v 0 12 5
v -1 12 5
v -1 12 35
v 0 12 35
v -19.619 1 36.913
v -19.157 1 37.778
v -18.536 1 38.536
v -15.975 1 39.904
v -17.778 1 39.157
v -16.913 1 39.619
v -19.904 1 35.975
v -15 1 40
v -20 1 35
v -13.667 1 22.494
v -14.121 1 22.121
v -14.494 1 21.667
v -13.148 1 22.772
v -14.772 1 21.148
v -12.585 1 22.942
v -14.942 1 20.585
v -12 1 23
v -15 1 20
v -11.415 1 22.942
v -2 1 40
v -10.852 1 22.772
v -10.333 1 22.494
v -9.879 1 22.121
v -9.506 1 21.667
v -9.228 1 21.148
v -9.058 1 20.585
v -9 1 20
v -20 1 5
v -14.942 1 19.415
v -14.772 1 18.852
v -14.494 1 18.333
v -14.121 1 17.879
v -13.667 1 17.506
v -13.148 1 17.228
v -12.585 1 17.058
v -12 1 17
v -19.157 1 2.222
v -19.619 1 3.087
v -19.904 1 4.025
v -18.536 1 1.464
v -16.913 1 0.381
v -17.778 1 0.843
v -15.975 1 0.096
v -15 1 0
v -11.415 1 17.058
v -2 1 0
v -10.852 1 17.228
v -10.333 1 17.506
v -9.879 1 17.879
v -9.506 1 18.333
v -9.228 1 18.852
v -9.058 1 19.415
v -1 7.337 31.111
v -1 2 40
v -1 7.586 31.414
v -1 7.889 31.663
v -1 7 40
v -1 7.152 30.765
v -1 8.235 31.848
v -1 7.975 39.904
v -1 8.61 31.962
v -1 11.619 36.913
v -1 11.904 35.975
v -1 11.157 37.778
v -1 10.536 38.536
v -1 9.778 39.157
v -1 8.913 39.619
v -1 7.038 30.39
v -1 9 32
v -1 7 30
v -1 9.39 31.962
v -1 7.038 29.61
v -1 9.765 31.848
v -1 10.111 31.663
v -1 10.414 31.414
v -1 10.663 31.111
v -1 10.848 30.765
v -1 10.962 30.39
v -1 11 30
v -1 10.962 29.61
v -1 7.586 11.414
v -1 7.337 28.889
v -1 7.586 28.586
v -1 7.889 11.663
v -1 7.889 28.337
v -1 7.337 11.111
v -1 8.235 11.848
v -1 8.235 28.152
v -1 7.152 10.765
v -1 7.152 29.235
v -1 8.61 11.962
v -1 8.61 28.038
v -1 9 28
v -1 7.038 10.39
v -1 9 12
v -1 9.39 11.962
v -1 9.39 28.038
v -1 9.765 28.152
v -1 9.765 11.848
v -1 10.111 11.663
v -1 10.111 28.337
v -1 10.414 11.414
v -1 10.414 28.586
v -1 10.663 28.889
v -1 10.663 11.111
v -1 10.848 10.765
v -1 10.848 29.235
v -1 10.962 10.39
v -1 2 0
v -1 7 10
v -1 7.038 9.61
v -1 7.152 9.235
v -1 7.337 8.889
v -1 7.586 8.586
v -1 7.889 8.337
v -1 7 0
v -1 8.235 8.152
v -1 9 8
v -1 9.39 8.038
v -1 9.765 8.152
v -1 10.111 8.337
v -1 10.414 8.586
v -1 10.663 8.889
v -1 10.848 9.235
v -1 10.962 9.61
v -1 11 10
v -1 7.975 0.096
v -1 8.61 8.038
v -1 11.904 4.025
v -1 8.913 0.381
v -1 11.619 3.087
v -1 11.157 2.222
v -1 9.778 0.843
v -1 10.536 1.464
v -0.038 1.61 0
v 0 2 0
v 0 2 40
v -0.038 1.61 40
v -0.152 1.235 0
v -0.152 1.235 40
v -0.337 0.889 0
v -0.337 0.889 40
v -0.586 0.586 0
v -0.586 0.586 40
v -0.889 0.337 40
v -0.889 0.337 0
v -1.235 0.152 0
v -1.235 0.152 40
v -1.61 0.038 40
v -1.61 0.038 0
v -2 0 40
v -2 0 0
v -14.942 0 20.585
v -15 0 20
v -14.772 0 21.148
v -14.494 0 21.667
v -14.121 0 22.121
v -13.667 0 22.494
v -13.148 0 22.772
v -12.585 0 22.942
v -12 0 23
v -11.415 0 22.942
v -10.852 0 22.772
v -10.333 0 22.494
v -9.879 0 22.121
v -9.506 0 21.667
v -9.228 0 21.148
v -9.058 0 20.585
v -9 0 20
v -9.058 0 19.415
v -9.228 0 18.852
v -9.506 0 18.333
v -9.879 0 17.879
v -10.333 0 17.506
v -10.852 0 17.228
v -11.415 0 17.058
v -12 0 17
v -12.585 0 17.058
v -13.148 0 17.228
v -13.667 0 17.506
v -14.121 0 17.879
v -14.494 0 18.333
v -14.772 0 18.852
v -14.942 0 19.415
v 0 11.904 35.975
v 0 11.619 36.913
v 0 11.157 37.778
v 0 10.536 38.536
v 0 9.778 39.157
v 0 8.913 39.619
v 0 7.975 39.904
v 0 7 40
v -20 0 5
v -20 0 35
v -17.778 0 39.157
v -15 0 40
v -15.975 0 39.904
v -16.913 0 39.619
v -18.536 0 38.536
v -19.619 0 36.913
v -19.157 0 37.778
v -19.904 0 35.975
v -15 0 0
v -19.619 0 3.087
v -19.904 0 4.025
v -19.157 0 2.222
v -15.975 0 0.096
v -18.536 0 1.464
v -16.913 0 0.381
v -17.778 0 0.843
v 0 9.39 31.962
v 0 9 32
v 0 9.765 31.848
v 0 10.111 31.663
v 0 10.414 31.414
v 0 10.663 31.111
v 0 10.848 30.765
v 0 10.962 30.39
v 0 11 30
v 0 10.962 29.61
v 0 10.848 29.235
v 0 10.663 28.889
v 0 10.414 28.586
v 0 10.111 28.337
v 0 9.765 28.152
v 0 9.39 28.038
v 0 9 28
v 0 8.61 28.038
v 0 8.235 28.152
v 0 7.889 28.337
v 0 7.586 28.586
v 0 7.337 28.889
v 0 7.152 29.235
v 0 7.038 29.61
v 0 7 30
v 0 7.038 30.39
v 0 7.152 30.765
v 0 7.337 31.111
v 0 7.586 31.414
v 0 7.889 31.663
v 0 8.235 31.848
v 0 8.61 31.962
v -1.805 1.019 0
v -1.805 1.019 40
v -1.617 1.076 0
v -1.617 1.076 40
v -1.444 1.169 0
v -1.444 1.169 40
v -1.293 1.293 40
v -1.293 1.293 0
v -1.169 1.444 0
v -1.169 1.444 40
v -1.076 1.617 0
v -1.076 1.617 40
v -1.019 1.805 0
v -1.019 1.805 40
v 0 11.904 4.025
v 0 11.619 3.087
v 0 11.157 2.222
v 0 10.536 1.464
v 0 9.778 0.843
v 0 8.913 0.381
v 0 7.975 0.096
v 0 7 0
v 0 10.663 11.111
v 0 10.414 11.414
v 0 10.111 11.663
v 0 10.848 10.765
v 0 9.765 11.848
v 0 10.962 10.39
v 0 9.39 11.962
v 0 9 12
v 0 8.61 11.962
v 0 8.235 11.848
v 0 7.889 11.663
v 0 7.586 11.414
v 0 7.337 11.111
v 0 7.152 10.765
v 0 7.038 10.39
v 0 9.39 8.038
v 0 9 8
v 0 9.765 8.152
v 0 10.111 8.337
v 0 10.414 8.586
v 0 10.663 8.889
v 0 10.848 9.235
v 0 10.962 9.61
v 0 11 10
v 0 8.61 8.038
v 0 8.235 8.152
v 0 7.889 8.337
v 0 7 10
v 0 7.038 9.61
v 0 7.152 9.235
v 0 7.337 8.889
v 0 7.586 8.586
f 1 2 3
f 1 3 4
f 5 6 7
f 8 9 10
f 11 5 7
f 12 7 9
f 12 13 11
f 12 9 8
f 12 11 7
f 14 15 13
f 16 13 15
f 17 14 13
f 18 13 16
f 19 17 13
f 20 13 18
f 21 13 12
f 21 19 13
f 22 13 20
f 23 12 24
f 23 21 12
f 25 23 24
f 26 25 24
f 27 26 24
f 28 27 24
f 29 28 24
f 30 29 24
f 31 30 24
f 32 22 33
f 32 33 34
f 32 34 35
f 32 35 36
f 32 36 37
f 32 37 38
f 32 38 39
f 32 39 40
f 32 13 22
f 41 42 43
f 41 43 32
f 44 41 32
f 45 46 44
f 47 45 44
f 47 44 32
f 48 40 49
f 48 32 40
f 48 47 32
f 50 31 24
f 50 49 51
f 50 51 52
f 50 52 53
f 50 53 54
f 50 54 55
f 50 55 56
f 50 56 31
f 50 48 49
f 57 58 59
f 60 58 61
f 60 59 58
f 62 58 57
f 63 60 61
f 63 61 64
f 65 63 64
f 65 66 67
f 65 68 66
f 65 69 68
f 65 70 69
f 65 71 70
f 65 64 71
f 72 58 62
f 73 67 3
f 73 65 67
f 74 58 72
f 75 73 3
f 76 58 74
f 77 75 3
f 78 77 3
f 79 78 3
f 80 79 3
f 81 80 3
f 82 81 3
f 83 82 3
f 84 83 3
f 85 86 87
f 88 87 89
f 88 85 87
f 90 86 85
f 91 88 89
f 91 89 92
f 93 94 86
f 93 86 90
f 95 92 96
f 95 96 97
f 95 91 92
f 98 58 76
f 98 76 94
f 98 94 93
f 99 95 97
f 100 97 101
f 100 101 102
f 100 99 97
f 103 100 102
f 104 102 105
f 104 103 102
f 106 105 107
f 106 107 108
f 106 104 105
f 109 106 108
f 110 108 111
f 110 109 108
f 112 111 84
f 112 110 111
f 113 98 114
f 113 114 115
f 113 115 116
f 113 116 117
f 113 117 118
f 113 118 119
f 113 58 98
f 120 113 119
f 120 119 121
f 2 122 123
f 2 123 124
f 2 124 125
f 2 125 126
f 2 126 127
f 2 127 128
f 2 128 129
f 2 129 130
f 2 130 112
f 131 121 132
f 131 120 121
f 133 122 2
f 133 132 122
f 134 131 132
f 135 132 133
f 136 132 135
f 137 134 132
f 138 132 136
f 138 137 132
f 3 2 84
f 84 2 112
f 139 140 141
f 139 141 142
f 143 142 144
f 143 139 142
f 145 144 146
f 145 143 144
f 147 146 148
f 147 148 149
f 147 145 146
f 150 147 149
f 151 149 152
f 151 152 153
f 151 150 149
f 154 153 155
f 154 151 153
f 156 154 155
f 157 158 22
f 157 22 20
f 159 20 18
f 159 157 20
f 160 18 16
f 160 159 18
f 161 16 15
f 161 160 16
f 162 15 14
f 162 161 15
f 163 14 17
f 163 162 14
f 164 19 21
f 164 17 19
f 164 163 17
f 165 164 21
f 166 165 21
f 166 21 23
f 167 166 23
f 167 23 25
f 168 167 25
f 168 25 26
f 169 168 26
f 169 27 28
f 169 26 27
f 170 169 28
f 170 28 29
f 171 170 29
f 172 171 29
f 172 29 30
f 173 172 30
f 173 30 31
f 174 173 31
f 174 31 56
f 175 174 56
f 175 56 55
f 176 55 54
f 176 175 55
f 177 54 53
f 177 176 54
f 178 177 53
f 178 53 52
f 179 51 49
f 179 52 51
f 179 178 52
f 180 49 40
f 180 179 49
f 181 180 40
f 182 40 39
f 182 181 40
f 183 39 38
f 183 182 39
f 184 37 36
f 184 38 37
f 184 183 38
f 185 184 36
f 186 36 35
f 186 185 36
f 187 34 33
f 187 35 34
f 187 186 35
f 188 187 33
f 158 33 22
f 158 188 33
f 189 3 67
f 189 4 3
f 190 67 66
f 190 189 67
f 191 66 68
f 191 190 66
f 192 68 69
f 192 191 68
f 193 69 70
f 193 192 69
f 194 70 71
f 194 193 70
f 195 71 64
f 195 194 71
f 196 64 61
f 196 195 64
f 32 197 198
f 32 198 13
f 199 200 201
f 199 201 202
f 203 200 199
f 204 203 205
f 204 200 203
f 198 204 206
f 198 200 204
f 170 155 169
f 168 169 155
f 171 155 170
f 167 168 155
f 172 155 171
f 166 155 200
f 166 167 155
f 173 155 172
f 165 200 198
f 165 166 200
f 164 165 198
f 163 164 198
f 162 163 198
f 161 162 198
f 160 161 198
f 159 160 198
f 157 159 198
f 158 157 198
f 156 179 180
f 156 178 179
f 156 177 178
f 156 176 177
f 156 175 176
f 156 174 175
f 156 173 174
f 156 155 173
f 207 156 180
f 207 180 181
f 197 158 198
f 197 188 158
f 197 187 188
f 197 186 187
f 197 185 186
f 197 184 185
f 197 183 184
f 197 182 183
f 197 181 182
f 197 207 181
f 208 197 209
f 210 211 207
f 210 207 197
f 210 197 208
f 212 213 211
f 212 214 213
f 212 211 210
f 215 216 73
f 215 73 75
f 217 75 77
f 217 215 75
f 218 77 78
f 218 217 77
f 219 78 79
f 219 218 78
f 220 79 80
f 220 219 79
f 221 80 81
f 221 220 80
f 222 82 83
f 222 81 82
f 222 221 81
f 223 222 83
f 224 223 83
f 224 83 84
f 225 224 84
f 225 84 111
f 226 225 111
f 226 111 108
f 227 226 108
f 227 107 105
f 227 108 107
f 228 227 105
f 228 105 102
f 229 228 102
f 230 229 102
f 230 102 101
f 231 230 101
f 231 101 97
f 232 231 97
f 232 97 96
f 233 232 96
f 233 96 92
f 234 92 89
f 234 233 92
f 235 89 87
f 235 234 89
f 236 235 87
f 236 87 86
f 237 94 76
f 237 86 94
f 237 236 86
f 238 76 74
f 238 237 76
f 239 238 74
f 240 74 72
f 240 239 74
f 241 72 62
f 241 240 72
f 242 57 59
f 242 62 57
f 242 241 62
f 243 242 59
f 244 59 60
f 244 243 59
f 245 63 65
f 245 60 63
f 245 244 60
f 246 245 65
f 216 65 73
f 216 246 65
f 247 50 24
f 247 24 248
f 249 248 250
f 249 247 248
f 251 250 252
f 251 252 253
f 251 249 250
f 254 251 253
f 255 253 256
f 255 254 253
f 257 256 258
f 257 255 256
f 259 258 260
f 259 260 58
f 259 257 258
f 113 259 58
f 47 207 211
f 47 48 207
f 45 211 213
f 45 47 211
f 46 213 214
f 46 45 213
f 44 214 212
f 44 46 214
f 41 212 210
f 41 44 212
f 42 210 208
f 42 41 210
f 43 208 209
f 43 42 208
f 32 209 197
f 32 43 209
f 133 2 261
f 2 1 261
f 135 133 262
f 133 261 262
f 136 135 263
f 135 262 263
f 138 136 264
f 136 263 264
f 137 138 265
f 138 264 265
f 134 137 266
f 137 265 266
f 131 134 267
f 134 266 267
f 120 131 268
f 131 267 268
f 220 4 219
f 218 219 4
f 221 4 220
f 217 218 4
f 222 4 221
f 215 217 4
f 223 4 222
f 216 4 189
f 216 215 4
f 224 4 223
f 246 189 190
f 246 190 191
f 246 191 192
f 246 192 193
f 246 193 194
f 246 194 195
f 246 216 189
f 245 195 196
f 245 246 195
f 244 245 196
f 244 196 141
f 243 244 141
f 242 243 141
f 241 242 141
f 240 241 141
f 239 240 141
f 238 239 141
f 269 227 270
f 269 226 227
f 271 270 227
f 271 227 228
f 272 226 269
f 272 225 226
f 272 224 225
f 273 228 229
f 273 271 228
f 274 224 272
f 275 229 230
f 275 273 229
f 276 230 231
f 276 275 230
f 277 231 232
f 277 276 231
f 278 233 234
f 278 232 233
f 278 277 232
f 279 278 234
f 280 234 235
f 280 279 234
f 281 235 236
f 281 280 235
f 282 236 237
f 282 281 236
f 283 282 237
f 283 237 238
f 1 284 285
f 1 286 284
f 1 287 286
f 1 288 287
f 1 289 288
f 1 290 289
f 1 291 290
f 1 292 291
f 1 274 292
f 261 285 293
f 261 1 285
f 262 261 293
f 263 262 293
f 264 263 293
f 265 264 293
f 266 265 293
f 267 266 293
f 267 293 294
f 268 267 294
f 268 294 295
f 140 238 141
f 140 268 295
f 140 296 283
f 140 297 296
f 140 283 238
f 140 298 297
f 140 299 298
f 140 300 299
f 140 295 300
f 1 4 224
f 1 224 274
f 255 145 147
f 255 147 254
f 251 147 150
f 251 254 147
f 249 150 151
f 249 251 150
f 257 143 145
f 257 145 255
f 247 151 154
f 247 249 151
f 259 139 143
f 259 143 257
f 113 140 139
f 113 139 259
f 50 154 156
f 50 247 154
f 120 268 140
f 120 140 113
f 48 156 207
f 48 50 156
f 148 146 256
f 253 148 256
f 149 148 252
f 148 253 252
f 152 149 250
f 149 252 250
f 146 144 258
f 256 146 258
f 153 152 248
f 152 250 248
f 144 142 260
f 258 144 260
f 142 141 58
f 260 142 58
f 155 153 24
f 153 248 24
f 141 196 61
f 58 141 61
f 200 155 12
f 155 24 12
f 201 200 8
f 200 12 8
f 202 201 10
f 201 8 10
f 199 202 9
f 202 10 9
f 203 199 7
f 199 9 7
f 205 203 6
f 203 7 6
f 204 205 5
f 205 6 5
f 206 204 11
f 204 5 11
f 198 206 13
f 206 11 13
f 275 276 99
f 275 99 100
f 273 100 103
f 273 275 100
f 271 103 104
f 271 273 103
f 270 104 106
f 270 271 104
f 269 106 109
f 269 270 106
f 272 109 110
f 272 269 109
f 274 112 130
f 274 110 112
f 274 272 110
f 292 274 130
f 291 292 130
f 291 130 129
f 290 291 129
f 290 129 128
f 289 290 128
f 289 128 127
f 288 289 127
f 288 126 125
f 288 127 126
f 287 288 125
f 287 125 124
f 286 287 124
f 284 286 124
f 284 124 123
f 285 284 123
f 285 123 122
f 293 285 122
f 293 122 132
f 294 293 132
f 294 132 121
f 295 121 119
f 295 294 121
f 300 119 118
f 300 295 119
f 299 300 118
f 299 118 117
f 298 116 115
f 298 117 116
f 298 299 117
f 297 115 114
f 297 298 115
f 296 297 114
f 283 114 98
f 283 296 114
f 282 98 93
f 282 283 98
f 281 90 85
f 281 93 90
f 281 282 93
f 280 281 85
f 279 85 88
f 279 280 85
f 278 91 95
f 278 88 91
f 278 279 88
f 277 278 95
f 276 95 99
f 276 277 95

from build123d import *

# Parameters (mm, degrees)
BASE_FLANGE1_DEPTH      = 40
CUT_EXTRUDE1_DEPTH      = 47.054315759
CUT_EXTRUDE1_DEPTH_BACK = 47.054315759
SKETCH6_R               = 3
CUT_EXTRUDE2_DEPTH      = 46.880278988
CUT_EXTRUDE2_DEPTH_BACK = 46.880278988
SKETCH7_R               = 2
FILLET1_R               = 5


# Sheet-metal steps are written as plain solids
with BuildPart() as part:
    # Sketch1 → Base-Flange1 (new body)
    with BuildSketch(Plane.XY):
        with BuildLine():
            Line((0, 12), (0, 2))
            ThreePointArc((0, 2), (-0.585786438, 0.585786438), (-2, 0))
            Line((-2, 0), (-20, 0))
            Line((-20, 0), (-20, 1))
            Line((-20, 1), (-2, 1))
            ThreePointArc((-2, 1), (-1.292893219, 1.292893219), (-1, 2))
            Line((-1, 2), (-1, 12))
            Line((-1, 12), (0, 12))
        make_face()
    extrude(amount=BASE_FLANGE1_DEPTH)

    # Sketch6 → Cut-Extrude1 (cut, two sides: drawn at the far end of the back side and taken through both)
    with BuildSketch(Plane(origin=(0, 1, 0), x_dir=(1, 0, 0), z_dir=(0, 1, 0)).offset(-CUT_EXTRUDE1_DEPTH_BACK)):
        with Locations(Location((-12, -20, 0), (0, 0, 180))):
            Circle(SKETCH6_R)
    extrude(amount=CUT_EXTRUDE1_DEPTH + CUT_EXTRUDE1_DEPTH_BACK, mode=Mode.SUBTRACT)

    # Sketch7 → Cut-Extrude2 (cut, two sides: drawn at the far end of the back side and taken through both)
    with BuildSketch(Plane.ZY.offset(1).offset(-CUT_EXTRUDE2_DEPTH_BACK)):
        with Locations((10, 9)):
            Circle(SKETCH7_R)
        with Locations((30, 9)):
            Circle(SKETCH7_R)
    extrude(amount=CUT_EXTRUDE2_DEPTH + CUT_EXTRUDE2_DEPTH_BACK, mode=Mode.SUBTRACT)

    # Fillet1
    fillet1_edges = [part.edges().sort_by_distance(p)[0] for p in [
        (-0.5, 12, 40),
        (-0.5, 12, 0),
        (-20, 0.5, 40),
        (-20, 0.5, 0),
    ]]
    fillet(fillet1_edges, radius=FILLET1_R)


solid = part.part
